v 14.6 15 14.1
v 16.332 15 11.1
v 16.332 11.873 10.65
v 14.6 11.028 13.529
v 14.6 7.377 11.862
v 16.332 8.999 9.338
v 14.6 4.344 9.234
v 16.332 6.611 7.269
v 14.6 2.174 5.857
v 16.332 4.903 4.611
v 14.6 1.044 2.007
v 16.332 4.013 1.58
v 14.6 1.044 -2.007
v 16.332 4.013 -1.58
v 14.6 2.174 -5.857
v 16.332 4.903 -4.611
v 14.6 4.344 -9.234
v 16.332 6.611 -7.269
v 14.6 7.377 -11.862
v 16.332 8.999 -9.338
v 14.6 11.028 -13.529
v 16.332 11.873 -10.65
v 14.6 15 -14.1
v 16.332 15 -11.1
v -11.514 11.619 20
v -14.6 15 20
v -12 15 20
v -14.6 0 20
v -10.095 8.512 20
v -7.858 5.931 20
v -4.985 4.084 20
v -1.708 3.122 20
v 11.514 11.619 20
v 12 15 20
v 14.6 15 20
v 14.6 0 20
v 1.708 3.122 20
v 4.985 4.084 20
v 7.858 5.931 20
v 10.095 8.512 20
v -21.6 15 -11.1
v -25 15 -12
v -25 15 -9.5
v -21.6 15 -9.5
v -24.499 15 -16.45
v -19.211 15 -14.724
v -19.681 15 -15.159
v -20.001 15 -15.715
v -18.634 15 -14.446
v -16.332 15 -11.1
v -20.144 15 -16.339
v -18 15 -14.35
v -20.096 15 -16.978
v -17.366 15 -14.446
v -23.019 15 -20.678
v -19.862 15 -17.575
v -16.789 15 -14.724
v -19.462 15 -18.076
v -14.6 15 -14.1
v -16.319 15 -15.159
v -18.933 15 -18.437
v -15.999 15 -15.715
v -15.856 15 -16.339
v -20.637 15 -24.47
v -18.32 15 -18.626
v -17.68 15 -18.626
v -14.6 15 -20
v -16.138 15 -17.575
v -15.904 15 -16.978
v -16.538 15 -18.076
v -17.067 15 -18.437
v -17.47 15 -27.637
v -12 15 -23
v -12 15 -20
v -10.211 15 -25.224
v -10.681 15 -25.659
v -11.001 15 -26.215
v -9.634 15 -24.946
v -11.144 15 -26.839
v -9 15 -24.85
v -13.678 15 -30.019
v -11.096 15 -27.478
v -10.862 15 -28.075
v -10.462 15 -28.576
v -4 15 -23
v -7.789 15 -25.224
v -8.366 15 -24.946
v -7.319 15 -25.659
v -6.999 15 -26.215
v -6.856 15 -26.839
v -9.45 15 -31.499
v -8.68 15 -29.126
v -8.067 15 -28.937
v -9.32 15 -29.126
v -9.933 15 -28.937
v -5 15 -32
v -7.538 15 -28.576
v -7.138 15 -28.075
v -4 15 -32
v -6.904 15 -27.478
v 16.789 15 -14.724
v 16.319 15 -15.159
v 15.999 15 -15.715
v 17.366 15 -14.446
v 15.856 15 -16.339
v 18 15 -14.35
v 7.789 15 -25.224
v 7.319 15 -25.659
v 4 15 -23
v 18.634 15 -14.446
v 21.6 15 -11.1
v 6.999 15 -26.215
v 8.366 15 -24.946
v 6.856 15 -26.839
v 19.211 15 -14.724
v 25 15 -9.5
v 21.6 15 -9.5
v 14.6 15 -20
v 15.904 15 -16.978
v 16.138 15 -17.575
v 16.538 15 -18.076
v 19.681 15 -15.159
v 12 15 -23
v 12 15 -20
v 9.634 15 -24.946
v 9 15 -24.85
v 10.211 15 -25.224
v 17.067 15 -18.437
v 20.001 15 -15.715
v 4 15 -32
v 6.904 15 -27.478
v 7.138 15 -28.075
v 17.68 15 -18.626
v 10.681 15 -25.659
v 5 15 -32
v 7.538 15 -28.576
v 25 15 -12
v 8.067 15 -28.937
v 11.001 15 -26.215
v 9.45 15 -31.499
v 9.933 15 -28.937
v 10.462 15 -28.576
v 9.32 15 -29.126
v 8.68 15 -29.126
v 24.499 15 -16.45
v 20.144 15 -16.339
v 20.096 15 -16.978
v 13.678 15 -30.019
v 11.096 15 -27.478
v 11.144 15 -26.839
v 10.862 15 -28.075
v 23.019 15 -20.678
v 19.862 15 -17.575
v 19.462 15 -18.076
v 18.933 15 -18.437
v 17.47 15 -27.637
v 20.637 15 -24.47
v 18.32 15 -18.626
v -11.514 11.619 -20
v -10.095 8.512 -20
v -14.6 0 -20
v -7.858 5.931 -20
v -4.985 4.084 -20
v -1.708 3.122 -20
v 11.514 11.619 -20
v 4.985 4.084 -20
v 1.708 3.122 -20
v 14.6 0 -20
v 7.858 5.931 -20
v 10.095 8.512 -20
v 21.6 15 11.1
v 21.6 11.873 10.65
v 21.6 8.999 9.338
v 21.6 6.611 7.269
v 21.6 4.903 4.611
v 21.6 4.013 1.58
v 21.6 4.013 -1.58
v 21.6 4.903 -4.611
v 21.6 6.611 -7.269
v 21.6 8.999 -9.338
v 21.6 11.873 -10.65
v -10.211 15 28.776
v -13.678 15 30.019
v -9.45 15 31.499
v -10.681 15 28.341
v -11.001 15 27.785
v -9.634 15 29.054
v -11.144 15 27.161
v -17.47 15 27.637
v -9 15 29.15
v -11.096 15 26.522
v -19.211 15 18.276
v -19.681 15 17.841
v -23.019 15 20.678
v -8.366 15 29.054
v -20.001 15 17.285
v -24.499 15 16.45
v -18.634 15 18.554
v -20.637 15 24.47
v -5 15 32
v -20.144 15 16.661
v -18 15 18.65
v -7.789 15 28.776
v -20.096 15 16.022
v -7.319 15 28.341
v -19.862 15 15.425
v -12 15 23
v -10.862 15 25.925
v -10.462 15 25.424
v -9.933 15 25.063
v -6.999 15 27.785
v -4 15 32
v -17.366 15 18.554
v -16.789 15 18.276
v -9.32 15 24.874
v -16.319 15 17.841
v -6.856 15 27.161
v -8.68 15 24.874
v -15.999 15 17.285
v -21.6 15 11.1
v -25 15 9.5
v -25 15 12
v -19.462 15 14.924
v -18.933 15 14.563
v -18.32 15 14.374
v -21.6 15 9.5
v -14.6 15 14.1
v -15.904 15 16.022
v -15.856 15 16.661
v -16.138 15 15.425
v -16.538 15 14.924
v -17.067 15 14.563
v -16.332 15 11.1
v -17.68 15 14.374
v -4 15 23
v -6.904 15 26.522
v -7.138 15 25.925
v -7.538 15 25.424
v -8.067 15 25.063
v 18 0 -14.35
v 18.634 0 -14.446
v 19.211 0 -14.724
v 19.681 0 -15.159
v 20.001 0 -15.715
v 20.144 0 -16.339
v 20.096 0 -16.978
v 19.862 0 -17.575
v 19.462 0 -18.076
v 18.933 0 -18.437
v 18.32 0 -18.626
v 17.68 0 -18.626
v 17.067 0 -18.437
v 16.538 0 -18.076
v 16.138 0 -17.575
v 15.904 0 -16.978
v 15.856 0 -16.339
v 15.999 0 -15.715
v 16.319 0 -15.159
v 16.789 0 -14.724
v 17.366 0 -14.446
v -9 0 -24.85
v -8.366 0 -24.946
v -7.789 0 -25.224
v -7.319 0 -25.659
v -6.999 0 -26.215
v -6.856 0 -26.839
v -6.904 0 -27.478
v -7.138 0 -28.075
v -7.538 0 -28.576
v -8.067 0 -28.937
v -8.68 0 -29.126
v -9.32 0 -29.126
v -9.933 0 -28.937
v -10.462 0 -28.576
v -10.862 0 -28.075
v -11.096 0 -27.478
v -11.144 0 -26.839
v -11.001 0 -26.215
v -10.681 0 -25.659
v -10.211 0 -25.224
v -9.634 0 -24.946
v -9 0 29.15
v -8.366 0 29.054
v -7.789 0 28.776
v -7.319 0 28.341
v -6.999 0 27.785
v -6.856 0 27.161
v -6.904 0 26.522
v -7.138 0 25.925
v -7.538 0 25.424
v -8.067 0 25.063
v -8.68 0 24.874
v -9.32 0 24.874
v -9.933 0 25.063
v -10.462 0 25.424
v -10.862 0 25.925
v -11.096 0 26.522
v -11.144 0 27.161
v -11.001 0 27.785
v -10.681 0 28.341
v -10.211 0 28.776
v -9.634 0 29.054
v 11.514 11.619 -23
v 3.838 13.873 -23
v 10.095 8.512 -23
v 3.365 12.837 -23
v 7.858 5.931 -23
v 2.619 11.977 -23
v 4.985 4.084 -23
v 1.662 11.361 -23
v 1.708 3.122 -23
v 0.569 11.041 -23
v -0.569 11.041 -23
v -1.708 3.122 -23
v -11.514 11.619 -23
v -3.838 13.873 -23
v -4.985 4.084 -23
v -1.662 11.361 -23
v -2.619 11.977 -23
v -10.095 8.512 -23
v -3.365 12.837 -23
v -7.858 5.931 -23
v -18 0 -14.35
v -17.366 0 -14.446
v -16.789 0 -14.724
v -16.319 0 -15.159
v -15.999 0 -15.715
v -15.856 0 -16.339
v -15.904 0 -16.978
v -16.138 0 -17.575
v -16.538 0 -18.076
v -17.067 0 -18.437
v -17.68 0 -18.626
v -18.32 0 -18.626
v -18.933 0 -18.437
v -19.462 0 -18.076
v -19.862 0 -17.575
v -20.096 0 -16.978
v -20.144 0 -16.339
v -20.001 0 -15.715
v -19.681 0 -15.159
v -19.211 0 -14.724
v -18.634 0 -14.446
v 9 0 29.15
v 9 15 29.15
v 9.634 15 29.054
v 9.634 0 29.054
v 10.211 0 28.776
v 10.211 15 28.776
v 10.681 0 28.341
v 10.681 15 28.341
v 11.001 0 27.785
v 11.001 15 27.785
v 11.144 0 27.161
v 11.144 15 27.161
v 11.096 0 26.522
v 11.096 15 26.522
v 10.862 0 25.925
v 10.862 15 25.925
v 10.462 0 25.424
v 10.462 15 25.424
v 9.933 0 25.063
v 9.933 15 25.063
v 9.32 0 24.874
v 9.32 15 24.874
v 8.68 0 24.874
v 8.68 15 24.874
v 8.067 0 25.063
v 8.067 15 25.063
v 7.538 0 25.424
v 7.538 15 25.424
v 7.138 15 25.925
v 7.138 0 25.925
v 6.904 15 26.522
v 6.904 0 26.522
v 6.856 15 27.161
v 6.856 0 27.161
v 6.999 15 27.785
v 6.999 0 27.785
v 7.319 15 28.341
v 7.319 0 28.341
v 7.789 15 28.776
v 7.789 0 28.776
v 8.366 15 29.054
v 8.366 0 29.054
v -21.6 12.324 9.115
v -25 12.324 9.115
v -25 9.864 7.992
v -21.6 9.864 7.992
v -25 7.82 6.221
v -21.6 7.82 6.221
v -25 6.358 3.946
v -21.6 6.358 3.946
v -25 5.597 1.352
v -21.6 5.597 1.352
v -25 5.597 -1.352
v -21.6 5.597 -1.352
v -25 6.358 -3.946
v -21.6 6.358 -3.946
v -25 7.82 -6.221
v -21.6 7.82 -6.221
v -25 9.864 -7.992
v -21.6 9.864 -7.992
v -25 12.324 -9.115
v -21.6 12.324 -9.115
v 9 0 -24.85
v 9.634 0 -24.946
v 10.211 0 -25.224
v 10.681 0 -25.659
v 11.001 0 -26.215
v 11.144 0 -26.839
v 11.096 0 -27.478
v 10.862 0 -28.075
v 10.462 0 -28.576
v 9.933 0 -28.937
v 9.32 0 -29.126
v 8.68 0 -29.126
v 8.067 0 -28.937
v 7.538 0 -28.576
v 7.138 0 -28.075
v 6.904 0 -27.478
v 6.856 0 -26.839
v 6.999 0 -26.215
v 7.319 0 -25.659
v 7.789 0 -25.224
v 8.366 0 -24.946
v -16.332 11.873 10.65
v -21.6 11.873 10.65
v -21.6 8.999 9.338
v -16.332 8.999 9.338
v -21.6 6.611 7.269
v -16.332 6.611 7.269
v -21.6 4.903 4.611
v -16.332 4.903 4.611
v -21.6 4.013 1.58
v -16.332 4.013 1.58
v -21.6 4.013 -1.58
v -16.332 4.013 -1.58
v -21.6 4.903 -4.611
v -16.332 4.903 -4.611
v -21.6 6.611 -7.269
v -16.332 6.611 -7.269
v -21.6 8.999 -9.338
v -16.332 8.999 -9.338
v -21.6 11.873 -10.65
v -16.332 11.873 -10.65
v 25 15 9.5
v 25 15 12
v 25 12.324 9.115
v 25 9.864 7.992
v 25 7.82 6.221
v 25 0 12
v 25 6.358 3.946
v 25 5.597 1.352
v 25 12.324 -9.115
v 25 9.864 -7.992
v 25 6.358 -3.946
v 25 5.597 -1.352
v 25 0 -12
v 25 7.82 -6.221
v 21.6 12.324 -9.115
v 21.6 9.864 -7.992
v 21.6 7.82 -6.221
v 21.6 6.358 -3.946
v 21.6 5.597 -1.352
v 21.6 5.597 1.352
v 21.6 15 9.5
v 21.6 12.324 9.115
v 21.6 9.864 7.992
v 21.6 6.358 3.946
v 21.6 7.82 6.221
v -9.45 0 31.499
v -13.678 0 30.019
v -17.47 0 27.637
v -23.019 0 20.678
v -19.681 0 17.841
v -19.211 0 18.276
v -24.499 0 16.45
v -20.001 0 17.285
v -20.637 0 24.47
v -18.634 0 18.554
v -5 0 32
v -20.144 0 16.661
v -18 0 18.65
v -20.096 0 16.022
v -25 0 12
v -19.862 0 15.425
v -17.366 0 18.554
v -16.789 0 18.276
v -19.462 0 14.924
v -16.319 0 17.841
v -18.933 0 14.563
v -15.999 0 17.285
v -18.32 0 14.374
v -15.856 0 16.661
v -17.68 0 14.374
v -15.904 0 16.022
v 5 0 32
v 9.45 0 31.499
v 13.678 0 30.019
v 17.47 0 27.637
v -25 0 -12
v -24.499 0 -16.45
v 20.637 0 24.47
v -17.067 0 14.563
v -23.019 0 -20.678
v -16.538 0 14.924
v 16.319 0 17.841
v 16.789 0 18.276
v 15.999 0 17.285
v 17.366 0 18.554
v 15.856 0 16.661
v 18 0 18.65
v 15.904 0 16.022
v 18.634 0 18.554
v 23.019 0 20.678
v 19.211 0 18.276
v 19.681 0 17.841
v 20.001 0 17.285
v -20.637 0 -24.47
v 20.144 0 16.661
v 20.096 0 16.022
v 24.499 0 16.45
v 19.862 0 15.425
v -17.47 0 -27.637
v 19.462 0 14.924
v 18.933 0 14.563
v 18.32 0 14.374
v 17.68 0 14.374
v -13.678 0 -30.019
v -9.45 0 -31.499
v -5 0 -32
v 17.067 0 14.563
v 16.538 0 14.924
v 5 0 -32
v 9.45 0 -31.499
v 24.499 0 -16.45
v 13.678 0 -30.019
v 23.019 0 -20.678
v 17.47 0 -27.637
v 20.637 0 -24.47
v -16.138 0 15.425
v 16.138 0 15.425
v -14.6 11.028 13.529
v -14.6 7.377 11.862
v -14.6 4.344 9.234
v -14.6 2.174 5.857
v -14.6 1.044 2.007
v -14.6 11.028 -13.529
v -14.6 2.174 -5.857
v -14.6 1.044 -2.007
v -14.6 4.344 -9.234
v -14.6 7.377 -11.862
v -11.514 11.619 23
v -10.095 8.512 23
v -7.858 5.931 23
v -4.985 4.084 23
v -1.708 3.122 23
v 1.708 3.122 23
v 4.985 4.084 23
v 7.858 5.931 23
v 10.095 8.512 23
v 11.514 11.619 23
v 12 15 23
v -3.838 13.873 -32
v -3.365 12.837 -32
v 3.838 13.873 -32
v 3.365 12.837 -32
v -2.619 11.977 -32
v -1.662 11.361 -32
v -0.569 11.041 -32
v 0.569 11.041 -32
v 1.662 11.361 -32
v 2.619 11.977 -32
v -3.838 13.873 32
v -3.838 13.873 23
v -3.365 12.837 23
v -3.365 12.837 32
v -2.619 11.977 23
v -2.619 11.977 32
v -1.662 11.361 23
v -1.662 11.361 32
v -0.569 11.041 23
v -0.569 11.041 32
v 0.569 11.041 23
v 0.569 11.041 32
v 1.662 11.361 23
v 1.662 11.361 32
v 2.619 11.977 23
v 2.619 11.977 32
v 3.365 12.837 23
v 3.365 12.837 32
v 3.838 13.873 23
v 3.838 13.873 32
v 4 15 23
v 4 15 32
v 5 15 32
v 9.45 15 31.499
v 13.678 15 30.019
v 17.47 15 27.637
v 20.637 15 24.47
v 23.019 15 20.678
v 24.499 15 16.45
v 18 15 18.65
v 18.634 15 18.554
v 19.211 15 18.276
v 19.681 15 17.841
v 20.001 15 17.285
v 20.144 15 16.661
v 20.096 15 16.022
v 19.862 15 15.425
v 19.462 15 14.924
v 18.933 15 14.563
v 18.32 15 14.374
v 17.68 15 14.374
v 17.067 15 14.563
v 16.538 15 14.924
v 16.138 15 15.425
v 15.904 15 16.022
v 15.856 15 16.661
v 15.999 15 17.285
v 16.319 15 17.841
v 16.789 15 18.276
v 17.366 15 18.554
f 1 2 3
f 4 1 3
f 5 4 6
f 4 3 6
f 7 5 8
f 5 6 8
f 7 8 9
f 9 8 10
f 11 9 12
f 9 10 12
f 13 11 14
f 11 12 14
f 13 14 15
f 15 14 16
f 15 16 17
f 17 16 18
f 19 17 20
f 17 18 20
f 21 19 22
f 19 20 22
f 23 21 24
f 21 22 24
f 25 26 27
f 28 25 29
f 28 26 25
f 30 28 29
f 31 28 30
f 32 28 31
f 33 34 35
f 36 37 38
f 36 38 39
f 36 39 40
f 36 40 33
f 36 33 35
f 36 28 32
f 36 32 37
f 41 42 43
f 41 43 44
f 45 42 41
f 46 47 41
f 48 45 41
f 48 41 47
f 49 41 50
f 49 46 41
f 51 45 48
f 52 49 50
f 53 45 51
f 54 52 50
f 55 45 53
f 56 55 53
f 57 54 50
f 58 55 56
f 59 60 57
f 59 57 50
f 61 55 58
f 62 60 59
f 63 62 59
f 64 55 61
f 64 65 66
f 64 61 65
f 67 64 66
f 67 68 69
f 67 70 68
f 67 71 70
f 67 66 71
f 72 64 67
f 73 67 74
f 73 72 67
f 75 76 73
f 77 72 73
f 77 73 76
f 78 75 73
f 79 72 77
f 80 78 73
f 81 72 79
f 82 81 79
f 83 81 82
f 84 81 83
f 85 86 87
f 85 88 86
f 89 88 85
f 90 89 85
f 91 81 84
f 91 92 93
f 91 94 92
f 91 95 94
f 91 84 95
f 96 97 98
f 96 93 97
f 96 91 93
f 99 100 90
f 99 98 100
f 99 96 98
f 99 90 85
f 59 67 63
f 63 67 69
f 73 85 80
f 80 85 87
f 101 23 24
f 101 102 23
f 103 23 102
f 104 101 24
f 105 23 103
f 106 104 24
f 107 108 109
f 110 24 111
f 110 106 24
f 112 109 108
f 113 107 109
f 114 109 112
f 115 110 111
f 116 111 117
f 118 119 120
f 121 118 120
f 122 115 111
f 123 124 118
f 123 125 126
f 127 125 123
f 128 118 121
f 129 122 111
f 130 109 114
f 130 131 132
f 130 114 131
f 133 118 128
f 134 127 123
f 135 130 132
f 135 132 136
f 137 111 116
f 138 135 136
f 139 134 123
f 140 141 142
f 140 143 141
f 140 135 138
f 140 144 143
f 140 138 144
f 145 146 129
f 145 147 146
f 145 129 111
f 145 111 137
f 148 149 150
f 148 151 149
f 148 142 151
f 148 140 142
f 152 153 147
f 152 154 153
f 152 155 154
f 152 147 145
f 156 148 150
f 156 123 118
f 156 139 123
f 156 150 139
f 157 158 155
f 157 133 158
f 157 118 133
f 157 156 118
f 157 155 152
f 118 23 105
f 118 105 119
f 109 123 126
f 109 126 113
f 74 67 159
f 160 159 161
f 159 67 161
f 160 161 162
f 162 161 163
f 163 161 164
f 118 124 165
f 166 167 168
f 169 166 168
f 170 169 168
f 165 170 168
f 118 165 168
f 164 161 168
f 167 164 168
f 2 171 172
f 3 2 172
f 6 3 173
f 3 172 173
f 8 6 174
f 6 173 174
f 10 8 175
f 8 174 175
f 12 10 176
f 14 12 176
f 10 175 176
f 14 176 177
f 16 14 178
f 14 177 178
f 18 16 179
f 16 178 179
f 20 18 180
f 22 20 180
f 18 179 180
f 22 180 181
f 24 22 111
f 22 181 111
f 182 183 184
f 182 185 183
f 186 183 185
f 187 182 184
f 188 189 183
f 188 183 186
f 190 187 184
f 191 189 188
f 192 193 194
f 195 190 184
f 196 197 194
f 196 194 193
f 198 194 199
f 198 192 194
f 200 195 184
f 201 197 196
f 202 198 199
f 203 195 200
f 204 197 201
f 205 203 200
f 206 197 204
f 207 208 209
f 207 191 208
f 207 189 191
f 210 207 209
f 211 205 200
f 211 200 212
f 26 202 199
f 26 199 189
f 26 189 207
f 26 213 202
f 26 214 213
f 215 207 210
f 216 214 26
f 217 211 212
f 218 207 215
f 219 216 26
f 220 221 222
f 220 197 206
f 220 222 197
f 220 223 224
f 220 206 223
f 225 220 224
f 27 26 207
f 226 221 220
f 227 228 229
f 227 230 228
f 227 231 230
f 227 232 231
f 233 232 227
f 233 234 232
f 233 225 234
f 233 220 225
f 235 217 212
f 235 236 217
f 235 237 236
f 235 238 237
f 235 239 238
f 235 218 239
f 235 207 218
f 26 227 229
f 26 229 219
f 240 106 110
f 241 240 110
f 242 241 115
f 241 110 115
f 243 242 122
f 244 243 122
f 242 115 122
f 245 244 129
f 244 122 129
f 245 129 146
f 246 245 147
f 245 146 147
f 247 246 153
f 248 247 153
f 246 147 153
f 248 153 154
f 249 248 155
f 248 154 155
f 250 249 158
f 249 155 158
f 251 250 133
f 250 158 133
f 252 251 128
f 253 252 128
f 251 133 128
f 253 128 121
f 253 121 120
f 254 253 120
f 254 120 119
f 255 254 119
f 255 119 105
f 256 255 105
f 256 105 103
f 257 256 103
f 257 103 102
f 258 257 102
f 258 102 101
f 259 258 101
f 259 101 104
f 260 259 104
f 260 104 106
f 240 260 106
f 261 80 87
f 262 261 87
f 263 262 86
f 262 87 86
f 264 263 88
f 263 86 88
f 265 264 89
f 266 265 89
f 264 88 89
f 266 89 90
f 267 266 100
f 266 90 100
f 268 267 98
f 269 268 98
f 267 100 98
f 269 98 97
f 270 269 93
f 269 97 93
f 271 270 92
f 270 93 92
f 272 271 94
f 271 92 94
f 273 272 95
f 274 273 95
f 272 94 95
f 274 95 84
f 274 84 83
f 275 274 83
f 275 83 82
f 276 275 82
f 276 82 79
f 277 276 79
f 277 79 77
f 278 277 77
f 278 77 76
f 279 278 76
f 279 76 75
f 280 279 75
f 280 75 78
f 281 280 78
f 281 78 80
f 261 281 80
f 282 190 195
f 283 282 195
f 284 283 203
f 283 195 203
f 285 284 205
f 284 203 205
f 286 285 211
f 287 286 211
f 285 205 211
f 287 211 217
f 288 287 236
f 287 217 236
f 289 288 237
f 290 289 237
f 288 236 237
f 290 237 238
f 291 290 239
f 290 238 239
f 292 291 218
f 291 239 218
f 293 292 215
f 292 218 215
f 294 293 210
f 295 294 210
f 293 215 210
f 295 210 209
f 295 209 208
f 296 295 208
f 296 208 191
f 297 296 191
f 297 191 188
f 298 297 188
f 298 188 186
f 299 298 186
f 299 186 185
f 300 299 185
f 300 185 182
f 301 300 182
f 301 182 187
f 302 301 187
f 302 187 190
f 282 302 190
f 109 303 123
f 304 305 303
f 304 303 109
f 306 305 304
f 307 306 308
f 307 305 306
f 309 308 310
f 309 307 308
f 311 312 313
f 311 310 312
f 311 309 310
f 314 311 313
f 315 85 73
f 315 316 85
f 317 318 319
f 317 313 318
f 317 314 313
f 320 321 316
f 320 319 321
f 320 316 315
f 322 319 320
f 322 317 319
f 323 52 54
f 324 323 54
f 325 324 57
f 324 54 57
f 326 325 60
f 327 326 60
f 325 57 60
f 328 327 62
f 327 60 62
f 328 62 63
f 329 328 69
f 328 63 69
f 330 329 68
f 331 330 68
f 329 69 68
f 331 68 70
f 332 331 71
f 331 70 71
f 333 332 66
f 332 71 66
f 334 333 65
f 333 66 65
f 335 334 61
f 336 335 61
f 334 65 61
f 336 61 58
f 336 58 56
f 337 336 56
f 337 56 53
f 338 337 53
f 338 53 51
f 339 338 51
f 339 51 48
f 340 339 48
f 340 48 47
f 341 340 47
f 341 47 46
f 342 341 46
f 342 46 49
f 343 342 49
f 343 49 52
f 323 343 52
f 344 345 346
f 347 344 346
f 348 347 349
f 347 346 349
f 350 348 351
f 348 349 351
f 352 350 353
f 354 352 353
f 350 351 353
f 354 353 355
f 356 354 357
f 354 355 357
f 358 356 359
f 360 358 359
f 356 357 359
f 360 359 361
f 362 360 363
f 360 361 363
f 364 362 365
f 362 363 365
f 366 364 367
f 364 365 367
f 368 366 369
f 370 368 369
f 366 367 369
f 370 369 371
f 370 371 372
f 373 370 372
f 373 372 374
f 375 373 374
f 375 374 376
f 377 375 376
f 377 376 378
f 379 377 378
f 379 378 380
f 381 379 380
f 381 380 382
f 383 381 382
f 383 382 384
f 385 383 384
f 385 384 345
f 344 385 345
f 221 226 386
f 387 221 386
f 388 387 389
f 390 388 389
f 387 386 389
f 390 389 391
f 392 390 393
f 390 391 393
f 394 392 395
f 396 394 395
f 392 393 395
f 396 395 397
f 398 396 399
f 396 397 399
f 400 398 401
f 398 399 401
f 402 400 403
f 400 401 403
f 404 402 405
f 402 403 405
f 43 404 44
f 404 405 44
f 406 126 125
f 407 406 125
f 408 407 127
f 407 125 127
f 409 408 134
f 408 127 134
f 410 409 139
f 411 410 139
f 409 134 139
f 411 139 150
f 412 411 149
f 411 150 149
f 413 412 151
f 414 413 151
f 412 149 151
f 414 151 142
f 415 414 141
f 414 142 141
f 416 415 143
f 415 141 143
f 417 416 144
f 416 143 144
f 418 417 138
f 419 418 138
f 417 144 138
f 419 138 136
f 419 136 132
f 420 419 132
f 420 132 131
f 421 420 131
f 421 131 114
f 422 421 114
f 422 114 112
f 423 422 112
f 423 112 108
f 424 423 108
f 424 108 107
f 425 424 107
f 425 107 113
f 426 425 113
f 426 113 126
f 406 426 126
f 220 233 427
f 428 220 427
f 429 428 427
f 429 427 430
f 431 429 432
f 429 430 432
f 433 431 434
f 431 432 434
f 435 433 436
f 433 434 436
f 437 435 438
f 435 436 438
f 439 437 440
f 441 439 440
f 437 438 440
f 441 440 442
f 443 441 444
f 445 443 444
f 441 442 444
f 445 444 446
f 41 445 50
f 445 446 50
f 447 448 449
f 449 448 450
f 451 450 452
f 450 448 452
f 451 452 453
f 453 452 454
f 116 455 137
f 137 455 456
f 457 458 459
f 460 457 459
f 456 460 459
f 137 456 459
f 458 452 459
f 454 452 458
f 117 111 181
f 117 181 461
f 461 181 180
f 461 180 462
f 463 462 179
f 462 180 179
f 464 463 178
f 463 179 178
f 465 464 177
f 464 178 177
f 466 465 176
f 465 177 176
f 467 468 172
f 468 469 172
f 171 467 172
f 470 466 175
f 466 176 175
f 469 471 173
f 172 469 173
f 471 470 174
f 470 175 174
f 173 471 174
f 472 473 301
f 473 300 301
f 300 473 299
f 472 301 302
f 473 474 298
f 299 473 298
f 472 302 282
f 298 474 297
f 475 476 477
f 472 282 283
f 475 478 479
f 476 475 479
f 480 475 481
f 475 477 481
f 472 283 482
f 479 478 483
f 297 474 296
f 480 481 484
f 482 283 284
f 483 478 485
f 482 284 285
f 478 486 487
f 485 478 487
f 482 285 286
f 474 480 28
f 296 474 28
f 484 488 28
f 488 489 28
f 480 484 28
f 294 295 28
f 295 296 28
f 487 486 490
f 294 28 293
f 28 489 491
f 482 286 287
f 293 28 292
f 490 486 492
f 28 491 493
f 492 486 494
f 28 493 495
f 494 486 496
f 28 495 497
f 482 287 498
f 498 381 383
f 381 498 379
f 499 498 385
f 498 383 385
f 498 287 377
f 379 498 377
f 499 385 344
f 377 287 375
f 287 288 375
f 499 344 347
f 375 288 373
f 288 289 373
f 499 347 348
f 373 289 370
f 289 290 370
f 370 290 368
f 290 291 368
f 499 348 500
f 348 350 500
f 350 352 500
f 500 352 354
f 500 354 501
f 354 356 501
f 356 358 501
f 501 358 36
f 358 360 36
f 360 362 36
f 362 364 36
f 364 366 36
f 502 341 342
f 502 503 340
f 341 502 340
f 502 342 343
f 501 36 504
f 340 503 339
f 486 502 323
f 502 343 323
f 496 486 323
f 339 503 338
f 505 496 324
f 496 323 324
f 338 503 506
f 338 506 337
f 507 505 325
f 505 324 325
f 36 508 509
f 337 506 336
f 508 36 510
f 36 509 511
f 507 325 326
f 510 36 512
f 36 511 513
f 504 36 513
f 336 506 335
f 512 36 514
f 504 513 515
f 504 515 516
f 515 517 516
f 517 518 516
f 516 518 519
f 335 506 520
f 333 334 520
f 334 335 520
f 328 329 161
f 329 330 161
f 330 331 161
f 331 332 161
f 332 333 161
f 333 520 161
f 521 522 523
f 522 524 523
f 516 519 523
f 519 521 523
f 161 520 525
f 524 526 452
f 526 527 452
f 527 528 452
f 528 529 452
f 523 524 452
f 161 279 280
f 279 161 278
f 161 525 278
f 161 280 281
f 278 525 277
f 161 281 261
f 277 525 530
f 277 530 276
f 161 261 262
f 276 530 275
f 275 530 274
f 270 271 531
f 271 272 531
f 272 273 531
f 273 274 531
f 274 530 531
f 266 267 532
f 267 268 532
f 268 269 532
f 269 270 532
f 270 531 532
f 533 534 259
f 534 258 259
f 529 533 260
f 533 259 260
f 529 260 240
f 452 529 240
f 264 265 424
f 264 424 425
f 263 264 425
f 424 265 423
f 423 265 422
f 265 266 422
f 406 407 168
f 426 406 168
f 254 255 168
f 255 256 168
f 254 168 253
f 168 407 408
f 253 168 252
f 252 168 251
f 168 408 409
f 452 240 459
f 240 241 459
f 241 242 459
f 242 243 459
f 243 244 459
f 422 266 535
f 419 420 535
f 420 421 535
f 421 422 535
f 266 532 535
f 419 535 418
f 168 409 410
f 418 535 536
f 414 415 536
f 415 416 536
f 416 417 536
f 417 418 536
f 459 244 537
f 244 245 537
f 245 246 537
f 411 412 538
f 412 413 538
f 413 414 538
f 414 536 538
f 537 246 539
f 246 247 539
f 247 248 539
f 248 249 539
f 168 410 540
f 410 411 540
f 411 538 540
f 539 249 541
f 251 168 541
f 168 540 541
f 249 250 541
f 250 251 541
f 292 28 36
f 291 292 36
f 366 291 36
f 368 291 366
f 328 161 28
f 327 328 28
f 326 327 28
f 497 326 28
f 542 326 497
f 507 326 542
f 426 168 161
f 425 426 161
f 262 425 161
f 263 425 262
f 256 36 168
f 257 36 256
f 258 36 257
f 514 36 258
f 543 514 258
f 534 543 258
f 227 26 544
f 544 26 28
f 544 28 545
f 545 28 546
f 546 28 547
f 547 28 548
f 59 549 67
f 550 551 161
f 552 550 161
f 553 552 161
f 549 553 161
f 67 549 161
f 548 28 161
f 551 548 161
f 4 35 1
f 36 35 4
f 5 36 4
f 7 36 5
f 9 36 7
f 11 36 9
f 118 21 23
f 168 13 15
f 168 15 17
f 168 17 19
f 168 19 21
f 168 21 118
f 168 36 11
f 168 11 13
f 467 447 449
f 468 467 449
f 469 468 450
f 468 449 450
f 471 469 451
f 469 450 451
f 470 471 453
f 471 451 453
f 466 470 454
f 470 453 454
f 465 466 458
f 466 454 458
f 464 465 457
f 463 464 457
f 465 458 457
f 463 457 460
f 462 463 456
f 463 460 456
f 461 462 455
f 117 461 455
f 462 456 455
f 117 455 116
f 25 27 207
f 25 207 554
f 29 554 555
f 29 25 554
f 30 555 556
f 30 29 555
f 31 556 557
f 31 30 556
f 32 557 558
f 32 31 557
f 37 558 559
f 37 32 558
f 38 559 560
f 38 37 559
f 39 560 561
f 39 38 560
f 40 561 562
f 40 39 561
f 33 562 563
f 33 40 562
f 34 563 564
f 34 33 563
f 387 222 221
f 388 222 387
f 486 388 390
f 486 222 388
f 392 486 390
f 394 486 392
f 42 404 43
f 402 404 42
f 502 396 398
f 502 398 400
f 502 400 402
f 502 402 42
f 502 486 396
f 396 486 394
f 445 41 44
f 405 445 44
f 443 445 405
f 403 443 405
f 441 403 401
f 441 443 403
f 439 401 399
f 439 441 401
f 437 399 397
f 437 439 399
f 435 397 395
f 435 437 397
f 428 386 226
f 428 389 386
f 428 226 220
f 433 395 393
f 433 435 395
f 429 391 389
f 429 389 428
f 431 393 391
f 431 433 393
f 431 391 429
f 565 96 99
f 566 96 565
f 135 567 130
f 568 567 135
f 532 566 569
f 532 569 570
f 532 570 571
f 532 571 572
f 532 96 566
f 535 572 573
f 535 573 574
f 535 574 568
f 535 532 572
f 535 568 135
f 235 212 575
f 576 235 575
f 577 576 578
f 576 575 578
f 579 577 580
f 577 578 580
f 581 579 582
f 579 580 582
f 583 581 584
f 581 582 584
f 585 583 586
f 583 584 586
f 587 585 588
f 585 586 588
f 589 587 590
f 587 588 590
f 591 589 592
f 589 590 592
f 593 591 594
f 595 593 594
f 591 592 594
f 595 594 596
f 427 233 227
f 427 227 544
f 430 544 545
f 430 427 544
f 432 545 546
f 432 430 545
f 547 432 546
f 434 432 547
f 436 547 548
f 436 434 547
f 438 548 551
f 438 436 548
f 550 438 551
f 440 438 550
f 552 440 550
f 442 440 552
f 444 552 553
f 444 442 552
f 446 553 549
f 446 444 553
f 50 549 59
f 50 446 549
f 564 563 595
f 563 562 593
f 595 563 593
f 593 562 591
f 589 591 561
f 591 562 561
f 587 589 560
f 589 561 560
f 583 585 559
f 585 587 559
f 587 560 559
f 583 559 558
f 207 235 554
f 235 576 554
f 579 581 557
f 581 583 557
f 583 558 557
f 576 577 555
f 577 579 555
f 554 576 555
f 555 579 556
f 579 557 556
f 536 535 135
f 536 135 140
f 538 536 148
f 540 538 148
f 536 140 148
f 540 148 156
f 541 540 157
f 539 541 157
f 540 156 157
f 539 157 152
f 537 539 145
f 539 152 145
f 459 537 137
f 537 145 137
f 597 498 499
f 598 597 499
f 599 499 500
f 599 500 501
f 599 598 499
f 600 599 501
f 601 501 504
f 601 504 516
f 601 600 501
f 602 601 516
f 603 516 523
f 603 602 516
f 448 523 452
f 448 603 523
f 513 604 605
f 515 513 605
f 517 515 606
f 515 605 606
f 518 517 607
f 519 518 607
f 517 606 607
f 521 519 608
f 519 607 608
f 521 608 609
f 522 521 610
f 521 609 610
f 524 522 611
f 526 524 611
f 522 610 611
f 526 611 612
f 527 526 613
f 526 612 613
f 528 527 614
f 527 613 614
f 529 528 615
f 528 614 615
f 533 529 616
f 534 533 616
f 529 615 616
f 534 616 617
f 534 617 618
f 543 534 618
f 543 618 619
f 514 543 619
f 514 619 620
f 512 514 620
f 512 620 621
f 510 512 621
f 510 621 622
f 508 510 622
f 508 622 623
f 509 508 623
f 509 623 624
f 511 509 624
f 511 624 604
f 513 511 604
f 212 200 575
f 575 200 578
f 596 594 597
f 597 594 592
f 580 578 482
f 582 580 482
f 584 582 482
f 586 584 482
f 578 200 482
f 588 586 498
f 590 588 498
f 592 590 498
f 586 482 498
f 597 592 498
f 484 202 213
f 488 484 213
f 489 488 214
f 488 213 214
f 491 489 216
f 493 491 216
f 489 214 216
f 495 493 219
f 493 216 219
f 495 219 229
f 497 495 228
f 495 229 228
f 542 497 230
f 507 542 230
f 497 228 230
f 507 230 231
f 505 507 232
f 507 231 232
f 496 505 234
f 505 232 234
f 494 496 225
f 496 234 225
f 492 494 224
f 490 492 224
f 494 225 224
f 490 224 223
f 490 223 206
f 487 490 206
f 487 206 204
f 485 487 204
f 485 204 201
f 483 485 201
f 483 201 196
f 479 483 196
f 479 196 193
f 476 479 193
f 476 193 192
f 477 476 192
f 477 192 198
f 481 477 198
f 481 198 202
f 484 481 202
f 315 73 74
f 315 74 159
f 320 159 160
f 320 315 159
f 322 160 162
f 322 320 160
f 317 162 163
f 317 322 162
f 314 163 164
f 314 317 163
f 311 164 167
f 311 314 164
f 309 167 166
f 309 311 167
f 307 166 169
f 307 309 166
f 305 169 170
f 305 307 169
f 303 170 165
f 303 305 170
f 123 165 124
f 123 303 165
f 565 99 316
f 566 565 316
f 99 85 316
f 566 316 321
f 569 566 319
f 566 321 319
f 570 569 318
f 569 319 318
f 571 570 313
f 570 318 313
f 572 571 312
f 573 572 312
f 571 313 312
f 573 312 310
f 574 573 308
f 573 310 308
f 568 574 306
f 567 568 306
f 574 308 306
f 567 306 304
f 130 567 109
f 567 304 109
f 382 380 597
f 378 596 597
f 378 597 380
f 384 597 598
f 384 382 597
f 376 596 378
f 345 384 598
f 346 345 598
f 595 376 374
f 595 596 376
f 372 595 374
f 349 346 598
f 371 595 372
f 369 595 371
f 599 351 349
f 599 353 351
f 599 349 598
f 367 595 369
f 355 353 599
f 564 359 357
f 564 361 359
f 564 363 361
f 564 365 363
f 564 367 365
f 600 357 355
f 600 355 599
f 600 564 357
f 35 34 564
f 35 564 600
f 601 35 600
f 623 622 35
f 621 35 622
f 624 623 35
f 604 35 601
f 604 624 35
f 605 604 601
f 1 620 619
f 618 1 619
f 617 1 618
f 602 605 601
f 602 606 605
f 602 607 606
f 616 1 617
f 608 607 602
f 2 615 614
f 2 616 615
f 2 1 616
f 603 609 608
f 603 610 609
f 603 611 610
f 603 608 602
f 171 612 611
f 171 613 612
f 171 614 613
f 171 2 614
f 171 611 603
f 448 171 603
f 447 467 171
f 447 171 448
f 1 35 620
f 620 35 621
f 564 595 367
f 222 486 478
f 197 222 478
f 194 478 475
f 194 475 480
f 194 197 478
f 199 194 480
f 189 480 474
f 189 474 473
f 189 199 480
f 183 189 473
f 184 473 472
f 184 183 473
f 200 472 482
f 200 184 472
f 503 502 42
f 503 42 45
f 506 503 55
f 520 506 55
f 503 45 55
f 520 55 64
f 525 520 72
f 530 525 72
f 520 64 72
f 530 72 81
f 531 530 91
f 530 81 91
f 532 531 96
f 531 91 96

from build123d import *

# Parameters (mm, degrees)
SKETCH1_W             = 50
SKETCH1_H             = 64
SKETCH1_W_2           = 29.2
SKETCH1_H_2           = 40
BOSS_EXTRUDE1_DEPTH   = 15
SKETCH3_W             = 7
SKETCH3_H             = 11.1
SKETCH4_R             = 9.5
CUT_EXTRUDE2_DEPTH    = 51
SKETCH5_R             = 4
CUT_EXTRUDE3_DEPTH    = 65
SKETCH8_R             = 2.15
CUT_EXTRUDE6_DEPTH    = 16
FILLET1_R             = 20
CHAMFER1_SIZE         = 3
CHAMFER1_SIZE2        = 1.732050808
CHAMFER1_PART_2_SIZE  = 3
CHAMFER1_PART_2_SIZE2 = 1.732050808
SKETCH9_W             = 12
SKETCH9_H             = 3


with BuildPart() as part:
    # Sketch1 → Boss-Extrude1 (new body)
    with BuildSketch(Plane(origin=(0, 0, 0), x_dir=(1, 0, 0), z_dir=(0, 1, 0))):
        Rectangle(SKETCH1_W, SKETCH1_H)
        Rectangle(SKETCH1_W_2, SKETCH1_H_2, mode=Mode.SUBTRACT)
    extrude(amount=BOSS_EXTRUDE1_DEPTH)

    # Sketch3 → Cut-Revolve1 (revolve, cut)
    with BuildSketch(Plane(origin=(0, 15, 0), x_dir=(1, 0, 0), z_dir=(0, 1, 0))):
        with Locations((18.1, -5.55)):
            Rectangle(SKETCH3_W, SKETCH3_H)
        with Locations((-18.1, -5.55)):
            Rectangle(SKETCH3_W, SKETCH3_H)
    revolve(axis=Axis((14.6, 15, 0), (1, 0, 0)), mode=Mode.SUBTRACT)

    # Sketch4 → Cut-Extrude2 (cut, through all)
    with BuildSketch(Plane(origin=(25, 0, 0), x_dir=(0, 0, -1), z_dir=(1, 0, 0))):
        with Locations((0, 15)):
            Circle(SKETCH4_R)
    extrude(amount=-CUT_EXTRUDE2_DEPTH, mode=Mode.SUBTRACT)

    # Sketch5 → Cut-Extrude3 (cut, through all)
    with BuildSketch(Plane.XY.offset(32)):
        with Locations((0, 15)):
            Circle(SKETCH5_R)
    extrude(amount=-CUT_EXTRUDE3_DEPTH, mode=Mode.SUBTRACT)

    # Sketch8 → Cut-Extrude6 (cut, through all)
    with BuildSketch(Plane(origin=(0, 15, 0), x_dir=(1, 0, 0), z_dir=(0, 1, 0))):
        with Locations(Location((18, 16.5, 0), (0, 0, 270))):  # turned: the seam where the file's is
            Circle(SKETCH8_R)
        with Locations(Location((18, -16.5, 0), (0, 0, 270))):  # turned: the seam where the file's is
            Circle(SKETCH8_R)
        with Locations(Location((-18, -16.5, 0), (0, 0, 270))):  # turned: the seam where the file's is
            Circle(SKETCH8_R)
        with Locations(Location((-18, 16.5, 0), (0, 0, 270))):  # turned: the seam where the file's is
            Circle(SKETCH8_R)
        with Locations(Location((9, -27, 0), (0, 0, 270))):  # turned: the seam where the file's is
            Circle(SKETCH8_R)
        with Locations(Location((-9, -27, 0), (0, 0, 270))):  # turned: the seam where the file's is
            Circle(SKETCH8_R)
        with Locations(Location((-9, 27, 0), (0, 0, 270))):  # turned: the seam where the file's is
            Circle(SKETCH8_R)
        with Locations(Location((9, 27, 0), (0, 0, 270))):  # turned: the seam where the file's is
            Circle(SKETCH8_R)
    extrude(amount=-CUT_EXTRUDE6_DEPTH, mode=Mode.SUBTRACT)

    # Fillet1
    fillet1_edges = [part.edges().sort_by_distance(p)[0] for p in [
        (-25, 7.5, -32),
        (25, 7.5, -32),
        (25, 7.5, 32),
        (-25, 7.5, 32),
    ]]
    fillet(fillet1_edges, radius=FILLET1_R)

    # Chamfer1
    chamfer1_edges = [part.edges().sort_by_distance(p)[0] for p in [
        (14.6, 3.9, 0),
    ]]
    chamfer1_side = [part.faces().sort_by_distance(p)[0] for p in [
        (14.6, 0.427200187, 0),
    ]]
    chamfer(chamfer1_edges, length=CHAMFER1_SIZE, length2=CHAMFER1_SIZE2, reference=chamfer1_side[0])

    # Chamfer1 part 2
    chamfer1_part_2_edges = [part.edges().sort_by_distance(p)[0] for p in [
        (-14.6, 3.9, 0),
    ]]
    chamfer1_part_2_side = [part.faces().sort_by_distance(p)[0] for p in [
        (-14.6, 0.427200187, 0),
    ]]
    chamfer(chamfer1_part_2_edges, length=CHAMFER1_PART_2_SIZE, length2=CHAMFER1_PART_2_SIZE2, reference=chamfer1_part_2_side[0])

    # Sketch9 → Cut-Revolve2 (revolve, cut)
    with BuildSketch(Plane(origin=(0, 15, 0), x_dir=(1, 0, 0), z_dir=(0, 1, 0))):
        with Locations((-6, -21.5)):
            Rectangle(SKETCH9_W, SKETCH9_H)
        with Locations((-6, 21.5)):
            Rectangle(SKETCH9_W, SKETCH9_H)
    revolve(axis=Axis((0, 15, -29.871415895), (0, 0, 1)), mode=Mode.SUBTRACT)


solid = part.part
